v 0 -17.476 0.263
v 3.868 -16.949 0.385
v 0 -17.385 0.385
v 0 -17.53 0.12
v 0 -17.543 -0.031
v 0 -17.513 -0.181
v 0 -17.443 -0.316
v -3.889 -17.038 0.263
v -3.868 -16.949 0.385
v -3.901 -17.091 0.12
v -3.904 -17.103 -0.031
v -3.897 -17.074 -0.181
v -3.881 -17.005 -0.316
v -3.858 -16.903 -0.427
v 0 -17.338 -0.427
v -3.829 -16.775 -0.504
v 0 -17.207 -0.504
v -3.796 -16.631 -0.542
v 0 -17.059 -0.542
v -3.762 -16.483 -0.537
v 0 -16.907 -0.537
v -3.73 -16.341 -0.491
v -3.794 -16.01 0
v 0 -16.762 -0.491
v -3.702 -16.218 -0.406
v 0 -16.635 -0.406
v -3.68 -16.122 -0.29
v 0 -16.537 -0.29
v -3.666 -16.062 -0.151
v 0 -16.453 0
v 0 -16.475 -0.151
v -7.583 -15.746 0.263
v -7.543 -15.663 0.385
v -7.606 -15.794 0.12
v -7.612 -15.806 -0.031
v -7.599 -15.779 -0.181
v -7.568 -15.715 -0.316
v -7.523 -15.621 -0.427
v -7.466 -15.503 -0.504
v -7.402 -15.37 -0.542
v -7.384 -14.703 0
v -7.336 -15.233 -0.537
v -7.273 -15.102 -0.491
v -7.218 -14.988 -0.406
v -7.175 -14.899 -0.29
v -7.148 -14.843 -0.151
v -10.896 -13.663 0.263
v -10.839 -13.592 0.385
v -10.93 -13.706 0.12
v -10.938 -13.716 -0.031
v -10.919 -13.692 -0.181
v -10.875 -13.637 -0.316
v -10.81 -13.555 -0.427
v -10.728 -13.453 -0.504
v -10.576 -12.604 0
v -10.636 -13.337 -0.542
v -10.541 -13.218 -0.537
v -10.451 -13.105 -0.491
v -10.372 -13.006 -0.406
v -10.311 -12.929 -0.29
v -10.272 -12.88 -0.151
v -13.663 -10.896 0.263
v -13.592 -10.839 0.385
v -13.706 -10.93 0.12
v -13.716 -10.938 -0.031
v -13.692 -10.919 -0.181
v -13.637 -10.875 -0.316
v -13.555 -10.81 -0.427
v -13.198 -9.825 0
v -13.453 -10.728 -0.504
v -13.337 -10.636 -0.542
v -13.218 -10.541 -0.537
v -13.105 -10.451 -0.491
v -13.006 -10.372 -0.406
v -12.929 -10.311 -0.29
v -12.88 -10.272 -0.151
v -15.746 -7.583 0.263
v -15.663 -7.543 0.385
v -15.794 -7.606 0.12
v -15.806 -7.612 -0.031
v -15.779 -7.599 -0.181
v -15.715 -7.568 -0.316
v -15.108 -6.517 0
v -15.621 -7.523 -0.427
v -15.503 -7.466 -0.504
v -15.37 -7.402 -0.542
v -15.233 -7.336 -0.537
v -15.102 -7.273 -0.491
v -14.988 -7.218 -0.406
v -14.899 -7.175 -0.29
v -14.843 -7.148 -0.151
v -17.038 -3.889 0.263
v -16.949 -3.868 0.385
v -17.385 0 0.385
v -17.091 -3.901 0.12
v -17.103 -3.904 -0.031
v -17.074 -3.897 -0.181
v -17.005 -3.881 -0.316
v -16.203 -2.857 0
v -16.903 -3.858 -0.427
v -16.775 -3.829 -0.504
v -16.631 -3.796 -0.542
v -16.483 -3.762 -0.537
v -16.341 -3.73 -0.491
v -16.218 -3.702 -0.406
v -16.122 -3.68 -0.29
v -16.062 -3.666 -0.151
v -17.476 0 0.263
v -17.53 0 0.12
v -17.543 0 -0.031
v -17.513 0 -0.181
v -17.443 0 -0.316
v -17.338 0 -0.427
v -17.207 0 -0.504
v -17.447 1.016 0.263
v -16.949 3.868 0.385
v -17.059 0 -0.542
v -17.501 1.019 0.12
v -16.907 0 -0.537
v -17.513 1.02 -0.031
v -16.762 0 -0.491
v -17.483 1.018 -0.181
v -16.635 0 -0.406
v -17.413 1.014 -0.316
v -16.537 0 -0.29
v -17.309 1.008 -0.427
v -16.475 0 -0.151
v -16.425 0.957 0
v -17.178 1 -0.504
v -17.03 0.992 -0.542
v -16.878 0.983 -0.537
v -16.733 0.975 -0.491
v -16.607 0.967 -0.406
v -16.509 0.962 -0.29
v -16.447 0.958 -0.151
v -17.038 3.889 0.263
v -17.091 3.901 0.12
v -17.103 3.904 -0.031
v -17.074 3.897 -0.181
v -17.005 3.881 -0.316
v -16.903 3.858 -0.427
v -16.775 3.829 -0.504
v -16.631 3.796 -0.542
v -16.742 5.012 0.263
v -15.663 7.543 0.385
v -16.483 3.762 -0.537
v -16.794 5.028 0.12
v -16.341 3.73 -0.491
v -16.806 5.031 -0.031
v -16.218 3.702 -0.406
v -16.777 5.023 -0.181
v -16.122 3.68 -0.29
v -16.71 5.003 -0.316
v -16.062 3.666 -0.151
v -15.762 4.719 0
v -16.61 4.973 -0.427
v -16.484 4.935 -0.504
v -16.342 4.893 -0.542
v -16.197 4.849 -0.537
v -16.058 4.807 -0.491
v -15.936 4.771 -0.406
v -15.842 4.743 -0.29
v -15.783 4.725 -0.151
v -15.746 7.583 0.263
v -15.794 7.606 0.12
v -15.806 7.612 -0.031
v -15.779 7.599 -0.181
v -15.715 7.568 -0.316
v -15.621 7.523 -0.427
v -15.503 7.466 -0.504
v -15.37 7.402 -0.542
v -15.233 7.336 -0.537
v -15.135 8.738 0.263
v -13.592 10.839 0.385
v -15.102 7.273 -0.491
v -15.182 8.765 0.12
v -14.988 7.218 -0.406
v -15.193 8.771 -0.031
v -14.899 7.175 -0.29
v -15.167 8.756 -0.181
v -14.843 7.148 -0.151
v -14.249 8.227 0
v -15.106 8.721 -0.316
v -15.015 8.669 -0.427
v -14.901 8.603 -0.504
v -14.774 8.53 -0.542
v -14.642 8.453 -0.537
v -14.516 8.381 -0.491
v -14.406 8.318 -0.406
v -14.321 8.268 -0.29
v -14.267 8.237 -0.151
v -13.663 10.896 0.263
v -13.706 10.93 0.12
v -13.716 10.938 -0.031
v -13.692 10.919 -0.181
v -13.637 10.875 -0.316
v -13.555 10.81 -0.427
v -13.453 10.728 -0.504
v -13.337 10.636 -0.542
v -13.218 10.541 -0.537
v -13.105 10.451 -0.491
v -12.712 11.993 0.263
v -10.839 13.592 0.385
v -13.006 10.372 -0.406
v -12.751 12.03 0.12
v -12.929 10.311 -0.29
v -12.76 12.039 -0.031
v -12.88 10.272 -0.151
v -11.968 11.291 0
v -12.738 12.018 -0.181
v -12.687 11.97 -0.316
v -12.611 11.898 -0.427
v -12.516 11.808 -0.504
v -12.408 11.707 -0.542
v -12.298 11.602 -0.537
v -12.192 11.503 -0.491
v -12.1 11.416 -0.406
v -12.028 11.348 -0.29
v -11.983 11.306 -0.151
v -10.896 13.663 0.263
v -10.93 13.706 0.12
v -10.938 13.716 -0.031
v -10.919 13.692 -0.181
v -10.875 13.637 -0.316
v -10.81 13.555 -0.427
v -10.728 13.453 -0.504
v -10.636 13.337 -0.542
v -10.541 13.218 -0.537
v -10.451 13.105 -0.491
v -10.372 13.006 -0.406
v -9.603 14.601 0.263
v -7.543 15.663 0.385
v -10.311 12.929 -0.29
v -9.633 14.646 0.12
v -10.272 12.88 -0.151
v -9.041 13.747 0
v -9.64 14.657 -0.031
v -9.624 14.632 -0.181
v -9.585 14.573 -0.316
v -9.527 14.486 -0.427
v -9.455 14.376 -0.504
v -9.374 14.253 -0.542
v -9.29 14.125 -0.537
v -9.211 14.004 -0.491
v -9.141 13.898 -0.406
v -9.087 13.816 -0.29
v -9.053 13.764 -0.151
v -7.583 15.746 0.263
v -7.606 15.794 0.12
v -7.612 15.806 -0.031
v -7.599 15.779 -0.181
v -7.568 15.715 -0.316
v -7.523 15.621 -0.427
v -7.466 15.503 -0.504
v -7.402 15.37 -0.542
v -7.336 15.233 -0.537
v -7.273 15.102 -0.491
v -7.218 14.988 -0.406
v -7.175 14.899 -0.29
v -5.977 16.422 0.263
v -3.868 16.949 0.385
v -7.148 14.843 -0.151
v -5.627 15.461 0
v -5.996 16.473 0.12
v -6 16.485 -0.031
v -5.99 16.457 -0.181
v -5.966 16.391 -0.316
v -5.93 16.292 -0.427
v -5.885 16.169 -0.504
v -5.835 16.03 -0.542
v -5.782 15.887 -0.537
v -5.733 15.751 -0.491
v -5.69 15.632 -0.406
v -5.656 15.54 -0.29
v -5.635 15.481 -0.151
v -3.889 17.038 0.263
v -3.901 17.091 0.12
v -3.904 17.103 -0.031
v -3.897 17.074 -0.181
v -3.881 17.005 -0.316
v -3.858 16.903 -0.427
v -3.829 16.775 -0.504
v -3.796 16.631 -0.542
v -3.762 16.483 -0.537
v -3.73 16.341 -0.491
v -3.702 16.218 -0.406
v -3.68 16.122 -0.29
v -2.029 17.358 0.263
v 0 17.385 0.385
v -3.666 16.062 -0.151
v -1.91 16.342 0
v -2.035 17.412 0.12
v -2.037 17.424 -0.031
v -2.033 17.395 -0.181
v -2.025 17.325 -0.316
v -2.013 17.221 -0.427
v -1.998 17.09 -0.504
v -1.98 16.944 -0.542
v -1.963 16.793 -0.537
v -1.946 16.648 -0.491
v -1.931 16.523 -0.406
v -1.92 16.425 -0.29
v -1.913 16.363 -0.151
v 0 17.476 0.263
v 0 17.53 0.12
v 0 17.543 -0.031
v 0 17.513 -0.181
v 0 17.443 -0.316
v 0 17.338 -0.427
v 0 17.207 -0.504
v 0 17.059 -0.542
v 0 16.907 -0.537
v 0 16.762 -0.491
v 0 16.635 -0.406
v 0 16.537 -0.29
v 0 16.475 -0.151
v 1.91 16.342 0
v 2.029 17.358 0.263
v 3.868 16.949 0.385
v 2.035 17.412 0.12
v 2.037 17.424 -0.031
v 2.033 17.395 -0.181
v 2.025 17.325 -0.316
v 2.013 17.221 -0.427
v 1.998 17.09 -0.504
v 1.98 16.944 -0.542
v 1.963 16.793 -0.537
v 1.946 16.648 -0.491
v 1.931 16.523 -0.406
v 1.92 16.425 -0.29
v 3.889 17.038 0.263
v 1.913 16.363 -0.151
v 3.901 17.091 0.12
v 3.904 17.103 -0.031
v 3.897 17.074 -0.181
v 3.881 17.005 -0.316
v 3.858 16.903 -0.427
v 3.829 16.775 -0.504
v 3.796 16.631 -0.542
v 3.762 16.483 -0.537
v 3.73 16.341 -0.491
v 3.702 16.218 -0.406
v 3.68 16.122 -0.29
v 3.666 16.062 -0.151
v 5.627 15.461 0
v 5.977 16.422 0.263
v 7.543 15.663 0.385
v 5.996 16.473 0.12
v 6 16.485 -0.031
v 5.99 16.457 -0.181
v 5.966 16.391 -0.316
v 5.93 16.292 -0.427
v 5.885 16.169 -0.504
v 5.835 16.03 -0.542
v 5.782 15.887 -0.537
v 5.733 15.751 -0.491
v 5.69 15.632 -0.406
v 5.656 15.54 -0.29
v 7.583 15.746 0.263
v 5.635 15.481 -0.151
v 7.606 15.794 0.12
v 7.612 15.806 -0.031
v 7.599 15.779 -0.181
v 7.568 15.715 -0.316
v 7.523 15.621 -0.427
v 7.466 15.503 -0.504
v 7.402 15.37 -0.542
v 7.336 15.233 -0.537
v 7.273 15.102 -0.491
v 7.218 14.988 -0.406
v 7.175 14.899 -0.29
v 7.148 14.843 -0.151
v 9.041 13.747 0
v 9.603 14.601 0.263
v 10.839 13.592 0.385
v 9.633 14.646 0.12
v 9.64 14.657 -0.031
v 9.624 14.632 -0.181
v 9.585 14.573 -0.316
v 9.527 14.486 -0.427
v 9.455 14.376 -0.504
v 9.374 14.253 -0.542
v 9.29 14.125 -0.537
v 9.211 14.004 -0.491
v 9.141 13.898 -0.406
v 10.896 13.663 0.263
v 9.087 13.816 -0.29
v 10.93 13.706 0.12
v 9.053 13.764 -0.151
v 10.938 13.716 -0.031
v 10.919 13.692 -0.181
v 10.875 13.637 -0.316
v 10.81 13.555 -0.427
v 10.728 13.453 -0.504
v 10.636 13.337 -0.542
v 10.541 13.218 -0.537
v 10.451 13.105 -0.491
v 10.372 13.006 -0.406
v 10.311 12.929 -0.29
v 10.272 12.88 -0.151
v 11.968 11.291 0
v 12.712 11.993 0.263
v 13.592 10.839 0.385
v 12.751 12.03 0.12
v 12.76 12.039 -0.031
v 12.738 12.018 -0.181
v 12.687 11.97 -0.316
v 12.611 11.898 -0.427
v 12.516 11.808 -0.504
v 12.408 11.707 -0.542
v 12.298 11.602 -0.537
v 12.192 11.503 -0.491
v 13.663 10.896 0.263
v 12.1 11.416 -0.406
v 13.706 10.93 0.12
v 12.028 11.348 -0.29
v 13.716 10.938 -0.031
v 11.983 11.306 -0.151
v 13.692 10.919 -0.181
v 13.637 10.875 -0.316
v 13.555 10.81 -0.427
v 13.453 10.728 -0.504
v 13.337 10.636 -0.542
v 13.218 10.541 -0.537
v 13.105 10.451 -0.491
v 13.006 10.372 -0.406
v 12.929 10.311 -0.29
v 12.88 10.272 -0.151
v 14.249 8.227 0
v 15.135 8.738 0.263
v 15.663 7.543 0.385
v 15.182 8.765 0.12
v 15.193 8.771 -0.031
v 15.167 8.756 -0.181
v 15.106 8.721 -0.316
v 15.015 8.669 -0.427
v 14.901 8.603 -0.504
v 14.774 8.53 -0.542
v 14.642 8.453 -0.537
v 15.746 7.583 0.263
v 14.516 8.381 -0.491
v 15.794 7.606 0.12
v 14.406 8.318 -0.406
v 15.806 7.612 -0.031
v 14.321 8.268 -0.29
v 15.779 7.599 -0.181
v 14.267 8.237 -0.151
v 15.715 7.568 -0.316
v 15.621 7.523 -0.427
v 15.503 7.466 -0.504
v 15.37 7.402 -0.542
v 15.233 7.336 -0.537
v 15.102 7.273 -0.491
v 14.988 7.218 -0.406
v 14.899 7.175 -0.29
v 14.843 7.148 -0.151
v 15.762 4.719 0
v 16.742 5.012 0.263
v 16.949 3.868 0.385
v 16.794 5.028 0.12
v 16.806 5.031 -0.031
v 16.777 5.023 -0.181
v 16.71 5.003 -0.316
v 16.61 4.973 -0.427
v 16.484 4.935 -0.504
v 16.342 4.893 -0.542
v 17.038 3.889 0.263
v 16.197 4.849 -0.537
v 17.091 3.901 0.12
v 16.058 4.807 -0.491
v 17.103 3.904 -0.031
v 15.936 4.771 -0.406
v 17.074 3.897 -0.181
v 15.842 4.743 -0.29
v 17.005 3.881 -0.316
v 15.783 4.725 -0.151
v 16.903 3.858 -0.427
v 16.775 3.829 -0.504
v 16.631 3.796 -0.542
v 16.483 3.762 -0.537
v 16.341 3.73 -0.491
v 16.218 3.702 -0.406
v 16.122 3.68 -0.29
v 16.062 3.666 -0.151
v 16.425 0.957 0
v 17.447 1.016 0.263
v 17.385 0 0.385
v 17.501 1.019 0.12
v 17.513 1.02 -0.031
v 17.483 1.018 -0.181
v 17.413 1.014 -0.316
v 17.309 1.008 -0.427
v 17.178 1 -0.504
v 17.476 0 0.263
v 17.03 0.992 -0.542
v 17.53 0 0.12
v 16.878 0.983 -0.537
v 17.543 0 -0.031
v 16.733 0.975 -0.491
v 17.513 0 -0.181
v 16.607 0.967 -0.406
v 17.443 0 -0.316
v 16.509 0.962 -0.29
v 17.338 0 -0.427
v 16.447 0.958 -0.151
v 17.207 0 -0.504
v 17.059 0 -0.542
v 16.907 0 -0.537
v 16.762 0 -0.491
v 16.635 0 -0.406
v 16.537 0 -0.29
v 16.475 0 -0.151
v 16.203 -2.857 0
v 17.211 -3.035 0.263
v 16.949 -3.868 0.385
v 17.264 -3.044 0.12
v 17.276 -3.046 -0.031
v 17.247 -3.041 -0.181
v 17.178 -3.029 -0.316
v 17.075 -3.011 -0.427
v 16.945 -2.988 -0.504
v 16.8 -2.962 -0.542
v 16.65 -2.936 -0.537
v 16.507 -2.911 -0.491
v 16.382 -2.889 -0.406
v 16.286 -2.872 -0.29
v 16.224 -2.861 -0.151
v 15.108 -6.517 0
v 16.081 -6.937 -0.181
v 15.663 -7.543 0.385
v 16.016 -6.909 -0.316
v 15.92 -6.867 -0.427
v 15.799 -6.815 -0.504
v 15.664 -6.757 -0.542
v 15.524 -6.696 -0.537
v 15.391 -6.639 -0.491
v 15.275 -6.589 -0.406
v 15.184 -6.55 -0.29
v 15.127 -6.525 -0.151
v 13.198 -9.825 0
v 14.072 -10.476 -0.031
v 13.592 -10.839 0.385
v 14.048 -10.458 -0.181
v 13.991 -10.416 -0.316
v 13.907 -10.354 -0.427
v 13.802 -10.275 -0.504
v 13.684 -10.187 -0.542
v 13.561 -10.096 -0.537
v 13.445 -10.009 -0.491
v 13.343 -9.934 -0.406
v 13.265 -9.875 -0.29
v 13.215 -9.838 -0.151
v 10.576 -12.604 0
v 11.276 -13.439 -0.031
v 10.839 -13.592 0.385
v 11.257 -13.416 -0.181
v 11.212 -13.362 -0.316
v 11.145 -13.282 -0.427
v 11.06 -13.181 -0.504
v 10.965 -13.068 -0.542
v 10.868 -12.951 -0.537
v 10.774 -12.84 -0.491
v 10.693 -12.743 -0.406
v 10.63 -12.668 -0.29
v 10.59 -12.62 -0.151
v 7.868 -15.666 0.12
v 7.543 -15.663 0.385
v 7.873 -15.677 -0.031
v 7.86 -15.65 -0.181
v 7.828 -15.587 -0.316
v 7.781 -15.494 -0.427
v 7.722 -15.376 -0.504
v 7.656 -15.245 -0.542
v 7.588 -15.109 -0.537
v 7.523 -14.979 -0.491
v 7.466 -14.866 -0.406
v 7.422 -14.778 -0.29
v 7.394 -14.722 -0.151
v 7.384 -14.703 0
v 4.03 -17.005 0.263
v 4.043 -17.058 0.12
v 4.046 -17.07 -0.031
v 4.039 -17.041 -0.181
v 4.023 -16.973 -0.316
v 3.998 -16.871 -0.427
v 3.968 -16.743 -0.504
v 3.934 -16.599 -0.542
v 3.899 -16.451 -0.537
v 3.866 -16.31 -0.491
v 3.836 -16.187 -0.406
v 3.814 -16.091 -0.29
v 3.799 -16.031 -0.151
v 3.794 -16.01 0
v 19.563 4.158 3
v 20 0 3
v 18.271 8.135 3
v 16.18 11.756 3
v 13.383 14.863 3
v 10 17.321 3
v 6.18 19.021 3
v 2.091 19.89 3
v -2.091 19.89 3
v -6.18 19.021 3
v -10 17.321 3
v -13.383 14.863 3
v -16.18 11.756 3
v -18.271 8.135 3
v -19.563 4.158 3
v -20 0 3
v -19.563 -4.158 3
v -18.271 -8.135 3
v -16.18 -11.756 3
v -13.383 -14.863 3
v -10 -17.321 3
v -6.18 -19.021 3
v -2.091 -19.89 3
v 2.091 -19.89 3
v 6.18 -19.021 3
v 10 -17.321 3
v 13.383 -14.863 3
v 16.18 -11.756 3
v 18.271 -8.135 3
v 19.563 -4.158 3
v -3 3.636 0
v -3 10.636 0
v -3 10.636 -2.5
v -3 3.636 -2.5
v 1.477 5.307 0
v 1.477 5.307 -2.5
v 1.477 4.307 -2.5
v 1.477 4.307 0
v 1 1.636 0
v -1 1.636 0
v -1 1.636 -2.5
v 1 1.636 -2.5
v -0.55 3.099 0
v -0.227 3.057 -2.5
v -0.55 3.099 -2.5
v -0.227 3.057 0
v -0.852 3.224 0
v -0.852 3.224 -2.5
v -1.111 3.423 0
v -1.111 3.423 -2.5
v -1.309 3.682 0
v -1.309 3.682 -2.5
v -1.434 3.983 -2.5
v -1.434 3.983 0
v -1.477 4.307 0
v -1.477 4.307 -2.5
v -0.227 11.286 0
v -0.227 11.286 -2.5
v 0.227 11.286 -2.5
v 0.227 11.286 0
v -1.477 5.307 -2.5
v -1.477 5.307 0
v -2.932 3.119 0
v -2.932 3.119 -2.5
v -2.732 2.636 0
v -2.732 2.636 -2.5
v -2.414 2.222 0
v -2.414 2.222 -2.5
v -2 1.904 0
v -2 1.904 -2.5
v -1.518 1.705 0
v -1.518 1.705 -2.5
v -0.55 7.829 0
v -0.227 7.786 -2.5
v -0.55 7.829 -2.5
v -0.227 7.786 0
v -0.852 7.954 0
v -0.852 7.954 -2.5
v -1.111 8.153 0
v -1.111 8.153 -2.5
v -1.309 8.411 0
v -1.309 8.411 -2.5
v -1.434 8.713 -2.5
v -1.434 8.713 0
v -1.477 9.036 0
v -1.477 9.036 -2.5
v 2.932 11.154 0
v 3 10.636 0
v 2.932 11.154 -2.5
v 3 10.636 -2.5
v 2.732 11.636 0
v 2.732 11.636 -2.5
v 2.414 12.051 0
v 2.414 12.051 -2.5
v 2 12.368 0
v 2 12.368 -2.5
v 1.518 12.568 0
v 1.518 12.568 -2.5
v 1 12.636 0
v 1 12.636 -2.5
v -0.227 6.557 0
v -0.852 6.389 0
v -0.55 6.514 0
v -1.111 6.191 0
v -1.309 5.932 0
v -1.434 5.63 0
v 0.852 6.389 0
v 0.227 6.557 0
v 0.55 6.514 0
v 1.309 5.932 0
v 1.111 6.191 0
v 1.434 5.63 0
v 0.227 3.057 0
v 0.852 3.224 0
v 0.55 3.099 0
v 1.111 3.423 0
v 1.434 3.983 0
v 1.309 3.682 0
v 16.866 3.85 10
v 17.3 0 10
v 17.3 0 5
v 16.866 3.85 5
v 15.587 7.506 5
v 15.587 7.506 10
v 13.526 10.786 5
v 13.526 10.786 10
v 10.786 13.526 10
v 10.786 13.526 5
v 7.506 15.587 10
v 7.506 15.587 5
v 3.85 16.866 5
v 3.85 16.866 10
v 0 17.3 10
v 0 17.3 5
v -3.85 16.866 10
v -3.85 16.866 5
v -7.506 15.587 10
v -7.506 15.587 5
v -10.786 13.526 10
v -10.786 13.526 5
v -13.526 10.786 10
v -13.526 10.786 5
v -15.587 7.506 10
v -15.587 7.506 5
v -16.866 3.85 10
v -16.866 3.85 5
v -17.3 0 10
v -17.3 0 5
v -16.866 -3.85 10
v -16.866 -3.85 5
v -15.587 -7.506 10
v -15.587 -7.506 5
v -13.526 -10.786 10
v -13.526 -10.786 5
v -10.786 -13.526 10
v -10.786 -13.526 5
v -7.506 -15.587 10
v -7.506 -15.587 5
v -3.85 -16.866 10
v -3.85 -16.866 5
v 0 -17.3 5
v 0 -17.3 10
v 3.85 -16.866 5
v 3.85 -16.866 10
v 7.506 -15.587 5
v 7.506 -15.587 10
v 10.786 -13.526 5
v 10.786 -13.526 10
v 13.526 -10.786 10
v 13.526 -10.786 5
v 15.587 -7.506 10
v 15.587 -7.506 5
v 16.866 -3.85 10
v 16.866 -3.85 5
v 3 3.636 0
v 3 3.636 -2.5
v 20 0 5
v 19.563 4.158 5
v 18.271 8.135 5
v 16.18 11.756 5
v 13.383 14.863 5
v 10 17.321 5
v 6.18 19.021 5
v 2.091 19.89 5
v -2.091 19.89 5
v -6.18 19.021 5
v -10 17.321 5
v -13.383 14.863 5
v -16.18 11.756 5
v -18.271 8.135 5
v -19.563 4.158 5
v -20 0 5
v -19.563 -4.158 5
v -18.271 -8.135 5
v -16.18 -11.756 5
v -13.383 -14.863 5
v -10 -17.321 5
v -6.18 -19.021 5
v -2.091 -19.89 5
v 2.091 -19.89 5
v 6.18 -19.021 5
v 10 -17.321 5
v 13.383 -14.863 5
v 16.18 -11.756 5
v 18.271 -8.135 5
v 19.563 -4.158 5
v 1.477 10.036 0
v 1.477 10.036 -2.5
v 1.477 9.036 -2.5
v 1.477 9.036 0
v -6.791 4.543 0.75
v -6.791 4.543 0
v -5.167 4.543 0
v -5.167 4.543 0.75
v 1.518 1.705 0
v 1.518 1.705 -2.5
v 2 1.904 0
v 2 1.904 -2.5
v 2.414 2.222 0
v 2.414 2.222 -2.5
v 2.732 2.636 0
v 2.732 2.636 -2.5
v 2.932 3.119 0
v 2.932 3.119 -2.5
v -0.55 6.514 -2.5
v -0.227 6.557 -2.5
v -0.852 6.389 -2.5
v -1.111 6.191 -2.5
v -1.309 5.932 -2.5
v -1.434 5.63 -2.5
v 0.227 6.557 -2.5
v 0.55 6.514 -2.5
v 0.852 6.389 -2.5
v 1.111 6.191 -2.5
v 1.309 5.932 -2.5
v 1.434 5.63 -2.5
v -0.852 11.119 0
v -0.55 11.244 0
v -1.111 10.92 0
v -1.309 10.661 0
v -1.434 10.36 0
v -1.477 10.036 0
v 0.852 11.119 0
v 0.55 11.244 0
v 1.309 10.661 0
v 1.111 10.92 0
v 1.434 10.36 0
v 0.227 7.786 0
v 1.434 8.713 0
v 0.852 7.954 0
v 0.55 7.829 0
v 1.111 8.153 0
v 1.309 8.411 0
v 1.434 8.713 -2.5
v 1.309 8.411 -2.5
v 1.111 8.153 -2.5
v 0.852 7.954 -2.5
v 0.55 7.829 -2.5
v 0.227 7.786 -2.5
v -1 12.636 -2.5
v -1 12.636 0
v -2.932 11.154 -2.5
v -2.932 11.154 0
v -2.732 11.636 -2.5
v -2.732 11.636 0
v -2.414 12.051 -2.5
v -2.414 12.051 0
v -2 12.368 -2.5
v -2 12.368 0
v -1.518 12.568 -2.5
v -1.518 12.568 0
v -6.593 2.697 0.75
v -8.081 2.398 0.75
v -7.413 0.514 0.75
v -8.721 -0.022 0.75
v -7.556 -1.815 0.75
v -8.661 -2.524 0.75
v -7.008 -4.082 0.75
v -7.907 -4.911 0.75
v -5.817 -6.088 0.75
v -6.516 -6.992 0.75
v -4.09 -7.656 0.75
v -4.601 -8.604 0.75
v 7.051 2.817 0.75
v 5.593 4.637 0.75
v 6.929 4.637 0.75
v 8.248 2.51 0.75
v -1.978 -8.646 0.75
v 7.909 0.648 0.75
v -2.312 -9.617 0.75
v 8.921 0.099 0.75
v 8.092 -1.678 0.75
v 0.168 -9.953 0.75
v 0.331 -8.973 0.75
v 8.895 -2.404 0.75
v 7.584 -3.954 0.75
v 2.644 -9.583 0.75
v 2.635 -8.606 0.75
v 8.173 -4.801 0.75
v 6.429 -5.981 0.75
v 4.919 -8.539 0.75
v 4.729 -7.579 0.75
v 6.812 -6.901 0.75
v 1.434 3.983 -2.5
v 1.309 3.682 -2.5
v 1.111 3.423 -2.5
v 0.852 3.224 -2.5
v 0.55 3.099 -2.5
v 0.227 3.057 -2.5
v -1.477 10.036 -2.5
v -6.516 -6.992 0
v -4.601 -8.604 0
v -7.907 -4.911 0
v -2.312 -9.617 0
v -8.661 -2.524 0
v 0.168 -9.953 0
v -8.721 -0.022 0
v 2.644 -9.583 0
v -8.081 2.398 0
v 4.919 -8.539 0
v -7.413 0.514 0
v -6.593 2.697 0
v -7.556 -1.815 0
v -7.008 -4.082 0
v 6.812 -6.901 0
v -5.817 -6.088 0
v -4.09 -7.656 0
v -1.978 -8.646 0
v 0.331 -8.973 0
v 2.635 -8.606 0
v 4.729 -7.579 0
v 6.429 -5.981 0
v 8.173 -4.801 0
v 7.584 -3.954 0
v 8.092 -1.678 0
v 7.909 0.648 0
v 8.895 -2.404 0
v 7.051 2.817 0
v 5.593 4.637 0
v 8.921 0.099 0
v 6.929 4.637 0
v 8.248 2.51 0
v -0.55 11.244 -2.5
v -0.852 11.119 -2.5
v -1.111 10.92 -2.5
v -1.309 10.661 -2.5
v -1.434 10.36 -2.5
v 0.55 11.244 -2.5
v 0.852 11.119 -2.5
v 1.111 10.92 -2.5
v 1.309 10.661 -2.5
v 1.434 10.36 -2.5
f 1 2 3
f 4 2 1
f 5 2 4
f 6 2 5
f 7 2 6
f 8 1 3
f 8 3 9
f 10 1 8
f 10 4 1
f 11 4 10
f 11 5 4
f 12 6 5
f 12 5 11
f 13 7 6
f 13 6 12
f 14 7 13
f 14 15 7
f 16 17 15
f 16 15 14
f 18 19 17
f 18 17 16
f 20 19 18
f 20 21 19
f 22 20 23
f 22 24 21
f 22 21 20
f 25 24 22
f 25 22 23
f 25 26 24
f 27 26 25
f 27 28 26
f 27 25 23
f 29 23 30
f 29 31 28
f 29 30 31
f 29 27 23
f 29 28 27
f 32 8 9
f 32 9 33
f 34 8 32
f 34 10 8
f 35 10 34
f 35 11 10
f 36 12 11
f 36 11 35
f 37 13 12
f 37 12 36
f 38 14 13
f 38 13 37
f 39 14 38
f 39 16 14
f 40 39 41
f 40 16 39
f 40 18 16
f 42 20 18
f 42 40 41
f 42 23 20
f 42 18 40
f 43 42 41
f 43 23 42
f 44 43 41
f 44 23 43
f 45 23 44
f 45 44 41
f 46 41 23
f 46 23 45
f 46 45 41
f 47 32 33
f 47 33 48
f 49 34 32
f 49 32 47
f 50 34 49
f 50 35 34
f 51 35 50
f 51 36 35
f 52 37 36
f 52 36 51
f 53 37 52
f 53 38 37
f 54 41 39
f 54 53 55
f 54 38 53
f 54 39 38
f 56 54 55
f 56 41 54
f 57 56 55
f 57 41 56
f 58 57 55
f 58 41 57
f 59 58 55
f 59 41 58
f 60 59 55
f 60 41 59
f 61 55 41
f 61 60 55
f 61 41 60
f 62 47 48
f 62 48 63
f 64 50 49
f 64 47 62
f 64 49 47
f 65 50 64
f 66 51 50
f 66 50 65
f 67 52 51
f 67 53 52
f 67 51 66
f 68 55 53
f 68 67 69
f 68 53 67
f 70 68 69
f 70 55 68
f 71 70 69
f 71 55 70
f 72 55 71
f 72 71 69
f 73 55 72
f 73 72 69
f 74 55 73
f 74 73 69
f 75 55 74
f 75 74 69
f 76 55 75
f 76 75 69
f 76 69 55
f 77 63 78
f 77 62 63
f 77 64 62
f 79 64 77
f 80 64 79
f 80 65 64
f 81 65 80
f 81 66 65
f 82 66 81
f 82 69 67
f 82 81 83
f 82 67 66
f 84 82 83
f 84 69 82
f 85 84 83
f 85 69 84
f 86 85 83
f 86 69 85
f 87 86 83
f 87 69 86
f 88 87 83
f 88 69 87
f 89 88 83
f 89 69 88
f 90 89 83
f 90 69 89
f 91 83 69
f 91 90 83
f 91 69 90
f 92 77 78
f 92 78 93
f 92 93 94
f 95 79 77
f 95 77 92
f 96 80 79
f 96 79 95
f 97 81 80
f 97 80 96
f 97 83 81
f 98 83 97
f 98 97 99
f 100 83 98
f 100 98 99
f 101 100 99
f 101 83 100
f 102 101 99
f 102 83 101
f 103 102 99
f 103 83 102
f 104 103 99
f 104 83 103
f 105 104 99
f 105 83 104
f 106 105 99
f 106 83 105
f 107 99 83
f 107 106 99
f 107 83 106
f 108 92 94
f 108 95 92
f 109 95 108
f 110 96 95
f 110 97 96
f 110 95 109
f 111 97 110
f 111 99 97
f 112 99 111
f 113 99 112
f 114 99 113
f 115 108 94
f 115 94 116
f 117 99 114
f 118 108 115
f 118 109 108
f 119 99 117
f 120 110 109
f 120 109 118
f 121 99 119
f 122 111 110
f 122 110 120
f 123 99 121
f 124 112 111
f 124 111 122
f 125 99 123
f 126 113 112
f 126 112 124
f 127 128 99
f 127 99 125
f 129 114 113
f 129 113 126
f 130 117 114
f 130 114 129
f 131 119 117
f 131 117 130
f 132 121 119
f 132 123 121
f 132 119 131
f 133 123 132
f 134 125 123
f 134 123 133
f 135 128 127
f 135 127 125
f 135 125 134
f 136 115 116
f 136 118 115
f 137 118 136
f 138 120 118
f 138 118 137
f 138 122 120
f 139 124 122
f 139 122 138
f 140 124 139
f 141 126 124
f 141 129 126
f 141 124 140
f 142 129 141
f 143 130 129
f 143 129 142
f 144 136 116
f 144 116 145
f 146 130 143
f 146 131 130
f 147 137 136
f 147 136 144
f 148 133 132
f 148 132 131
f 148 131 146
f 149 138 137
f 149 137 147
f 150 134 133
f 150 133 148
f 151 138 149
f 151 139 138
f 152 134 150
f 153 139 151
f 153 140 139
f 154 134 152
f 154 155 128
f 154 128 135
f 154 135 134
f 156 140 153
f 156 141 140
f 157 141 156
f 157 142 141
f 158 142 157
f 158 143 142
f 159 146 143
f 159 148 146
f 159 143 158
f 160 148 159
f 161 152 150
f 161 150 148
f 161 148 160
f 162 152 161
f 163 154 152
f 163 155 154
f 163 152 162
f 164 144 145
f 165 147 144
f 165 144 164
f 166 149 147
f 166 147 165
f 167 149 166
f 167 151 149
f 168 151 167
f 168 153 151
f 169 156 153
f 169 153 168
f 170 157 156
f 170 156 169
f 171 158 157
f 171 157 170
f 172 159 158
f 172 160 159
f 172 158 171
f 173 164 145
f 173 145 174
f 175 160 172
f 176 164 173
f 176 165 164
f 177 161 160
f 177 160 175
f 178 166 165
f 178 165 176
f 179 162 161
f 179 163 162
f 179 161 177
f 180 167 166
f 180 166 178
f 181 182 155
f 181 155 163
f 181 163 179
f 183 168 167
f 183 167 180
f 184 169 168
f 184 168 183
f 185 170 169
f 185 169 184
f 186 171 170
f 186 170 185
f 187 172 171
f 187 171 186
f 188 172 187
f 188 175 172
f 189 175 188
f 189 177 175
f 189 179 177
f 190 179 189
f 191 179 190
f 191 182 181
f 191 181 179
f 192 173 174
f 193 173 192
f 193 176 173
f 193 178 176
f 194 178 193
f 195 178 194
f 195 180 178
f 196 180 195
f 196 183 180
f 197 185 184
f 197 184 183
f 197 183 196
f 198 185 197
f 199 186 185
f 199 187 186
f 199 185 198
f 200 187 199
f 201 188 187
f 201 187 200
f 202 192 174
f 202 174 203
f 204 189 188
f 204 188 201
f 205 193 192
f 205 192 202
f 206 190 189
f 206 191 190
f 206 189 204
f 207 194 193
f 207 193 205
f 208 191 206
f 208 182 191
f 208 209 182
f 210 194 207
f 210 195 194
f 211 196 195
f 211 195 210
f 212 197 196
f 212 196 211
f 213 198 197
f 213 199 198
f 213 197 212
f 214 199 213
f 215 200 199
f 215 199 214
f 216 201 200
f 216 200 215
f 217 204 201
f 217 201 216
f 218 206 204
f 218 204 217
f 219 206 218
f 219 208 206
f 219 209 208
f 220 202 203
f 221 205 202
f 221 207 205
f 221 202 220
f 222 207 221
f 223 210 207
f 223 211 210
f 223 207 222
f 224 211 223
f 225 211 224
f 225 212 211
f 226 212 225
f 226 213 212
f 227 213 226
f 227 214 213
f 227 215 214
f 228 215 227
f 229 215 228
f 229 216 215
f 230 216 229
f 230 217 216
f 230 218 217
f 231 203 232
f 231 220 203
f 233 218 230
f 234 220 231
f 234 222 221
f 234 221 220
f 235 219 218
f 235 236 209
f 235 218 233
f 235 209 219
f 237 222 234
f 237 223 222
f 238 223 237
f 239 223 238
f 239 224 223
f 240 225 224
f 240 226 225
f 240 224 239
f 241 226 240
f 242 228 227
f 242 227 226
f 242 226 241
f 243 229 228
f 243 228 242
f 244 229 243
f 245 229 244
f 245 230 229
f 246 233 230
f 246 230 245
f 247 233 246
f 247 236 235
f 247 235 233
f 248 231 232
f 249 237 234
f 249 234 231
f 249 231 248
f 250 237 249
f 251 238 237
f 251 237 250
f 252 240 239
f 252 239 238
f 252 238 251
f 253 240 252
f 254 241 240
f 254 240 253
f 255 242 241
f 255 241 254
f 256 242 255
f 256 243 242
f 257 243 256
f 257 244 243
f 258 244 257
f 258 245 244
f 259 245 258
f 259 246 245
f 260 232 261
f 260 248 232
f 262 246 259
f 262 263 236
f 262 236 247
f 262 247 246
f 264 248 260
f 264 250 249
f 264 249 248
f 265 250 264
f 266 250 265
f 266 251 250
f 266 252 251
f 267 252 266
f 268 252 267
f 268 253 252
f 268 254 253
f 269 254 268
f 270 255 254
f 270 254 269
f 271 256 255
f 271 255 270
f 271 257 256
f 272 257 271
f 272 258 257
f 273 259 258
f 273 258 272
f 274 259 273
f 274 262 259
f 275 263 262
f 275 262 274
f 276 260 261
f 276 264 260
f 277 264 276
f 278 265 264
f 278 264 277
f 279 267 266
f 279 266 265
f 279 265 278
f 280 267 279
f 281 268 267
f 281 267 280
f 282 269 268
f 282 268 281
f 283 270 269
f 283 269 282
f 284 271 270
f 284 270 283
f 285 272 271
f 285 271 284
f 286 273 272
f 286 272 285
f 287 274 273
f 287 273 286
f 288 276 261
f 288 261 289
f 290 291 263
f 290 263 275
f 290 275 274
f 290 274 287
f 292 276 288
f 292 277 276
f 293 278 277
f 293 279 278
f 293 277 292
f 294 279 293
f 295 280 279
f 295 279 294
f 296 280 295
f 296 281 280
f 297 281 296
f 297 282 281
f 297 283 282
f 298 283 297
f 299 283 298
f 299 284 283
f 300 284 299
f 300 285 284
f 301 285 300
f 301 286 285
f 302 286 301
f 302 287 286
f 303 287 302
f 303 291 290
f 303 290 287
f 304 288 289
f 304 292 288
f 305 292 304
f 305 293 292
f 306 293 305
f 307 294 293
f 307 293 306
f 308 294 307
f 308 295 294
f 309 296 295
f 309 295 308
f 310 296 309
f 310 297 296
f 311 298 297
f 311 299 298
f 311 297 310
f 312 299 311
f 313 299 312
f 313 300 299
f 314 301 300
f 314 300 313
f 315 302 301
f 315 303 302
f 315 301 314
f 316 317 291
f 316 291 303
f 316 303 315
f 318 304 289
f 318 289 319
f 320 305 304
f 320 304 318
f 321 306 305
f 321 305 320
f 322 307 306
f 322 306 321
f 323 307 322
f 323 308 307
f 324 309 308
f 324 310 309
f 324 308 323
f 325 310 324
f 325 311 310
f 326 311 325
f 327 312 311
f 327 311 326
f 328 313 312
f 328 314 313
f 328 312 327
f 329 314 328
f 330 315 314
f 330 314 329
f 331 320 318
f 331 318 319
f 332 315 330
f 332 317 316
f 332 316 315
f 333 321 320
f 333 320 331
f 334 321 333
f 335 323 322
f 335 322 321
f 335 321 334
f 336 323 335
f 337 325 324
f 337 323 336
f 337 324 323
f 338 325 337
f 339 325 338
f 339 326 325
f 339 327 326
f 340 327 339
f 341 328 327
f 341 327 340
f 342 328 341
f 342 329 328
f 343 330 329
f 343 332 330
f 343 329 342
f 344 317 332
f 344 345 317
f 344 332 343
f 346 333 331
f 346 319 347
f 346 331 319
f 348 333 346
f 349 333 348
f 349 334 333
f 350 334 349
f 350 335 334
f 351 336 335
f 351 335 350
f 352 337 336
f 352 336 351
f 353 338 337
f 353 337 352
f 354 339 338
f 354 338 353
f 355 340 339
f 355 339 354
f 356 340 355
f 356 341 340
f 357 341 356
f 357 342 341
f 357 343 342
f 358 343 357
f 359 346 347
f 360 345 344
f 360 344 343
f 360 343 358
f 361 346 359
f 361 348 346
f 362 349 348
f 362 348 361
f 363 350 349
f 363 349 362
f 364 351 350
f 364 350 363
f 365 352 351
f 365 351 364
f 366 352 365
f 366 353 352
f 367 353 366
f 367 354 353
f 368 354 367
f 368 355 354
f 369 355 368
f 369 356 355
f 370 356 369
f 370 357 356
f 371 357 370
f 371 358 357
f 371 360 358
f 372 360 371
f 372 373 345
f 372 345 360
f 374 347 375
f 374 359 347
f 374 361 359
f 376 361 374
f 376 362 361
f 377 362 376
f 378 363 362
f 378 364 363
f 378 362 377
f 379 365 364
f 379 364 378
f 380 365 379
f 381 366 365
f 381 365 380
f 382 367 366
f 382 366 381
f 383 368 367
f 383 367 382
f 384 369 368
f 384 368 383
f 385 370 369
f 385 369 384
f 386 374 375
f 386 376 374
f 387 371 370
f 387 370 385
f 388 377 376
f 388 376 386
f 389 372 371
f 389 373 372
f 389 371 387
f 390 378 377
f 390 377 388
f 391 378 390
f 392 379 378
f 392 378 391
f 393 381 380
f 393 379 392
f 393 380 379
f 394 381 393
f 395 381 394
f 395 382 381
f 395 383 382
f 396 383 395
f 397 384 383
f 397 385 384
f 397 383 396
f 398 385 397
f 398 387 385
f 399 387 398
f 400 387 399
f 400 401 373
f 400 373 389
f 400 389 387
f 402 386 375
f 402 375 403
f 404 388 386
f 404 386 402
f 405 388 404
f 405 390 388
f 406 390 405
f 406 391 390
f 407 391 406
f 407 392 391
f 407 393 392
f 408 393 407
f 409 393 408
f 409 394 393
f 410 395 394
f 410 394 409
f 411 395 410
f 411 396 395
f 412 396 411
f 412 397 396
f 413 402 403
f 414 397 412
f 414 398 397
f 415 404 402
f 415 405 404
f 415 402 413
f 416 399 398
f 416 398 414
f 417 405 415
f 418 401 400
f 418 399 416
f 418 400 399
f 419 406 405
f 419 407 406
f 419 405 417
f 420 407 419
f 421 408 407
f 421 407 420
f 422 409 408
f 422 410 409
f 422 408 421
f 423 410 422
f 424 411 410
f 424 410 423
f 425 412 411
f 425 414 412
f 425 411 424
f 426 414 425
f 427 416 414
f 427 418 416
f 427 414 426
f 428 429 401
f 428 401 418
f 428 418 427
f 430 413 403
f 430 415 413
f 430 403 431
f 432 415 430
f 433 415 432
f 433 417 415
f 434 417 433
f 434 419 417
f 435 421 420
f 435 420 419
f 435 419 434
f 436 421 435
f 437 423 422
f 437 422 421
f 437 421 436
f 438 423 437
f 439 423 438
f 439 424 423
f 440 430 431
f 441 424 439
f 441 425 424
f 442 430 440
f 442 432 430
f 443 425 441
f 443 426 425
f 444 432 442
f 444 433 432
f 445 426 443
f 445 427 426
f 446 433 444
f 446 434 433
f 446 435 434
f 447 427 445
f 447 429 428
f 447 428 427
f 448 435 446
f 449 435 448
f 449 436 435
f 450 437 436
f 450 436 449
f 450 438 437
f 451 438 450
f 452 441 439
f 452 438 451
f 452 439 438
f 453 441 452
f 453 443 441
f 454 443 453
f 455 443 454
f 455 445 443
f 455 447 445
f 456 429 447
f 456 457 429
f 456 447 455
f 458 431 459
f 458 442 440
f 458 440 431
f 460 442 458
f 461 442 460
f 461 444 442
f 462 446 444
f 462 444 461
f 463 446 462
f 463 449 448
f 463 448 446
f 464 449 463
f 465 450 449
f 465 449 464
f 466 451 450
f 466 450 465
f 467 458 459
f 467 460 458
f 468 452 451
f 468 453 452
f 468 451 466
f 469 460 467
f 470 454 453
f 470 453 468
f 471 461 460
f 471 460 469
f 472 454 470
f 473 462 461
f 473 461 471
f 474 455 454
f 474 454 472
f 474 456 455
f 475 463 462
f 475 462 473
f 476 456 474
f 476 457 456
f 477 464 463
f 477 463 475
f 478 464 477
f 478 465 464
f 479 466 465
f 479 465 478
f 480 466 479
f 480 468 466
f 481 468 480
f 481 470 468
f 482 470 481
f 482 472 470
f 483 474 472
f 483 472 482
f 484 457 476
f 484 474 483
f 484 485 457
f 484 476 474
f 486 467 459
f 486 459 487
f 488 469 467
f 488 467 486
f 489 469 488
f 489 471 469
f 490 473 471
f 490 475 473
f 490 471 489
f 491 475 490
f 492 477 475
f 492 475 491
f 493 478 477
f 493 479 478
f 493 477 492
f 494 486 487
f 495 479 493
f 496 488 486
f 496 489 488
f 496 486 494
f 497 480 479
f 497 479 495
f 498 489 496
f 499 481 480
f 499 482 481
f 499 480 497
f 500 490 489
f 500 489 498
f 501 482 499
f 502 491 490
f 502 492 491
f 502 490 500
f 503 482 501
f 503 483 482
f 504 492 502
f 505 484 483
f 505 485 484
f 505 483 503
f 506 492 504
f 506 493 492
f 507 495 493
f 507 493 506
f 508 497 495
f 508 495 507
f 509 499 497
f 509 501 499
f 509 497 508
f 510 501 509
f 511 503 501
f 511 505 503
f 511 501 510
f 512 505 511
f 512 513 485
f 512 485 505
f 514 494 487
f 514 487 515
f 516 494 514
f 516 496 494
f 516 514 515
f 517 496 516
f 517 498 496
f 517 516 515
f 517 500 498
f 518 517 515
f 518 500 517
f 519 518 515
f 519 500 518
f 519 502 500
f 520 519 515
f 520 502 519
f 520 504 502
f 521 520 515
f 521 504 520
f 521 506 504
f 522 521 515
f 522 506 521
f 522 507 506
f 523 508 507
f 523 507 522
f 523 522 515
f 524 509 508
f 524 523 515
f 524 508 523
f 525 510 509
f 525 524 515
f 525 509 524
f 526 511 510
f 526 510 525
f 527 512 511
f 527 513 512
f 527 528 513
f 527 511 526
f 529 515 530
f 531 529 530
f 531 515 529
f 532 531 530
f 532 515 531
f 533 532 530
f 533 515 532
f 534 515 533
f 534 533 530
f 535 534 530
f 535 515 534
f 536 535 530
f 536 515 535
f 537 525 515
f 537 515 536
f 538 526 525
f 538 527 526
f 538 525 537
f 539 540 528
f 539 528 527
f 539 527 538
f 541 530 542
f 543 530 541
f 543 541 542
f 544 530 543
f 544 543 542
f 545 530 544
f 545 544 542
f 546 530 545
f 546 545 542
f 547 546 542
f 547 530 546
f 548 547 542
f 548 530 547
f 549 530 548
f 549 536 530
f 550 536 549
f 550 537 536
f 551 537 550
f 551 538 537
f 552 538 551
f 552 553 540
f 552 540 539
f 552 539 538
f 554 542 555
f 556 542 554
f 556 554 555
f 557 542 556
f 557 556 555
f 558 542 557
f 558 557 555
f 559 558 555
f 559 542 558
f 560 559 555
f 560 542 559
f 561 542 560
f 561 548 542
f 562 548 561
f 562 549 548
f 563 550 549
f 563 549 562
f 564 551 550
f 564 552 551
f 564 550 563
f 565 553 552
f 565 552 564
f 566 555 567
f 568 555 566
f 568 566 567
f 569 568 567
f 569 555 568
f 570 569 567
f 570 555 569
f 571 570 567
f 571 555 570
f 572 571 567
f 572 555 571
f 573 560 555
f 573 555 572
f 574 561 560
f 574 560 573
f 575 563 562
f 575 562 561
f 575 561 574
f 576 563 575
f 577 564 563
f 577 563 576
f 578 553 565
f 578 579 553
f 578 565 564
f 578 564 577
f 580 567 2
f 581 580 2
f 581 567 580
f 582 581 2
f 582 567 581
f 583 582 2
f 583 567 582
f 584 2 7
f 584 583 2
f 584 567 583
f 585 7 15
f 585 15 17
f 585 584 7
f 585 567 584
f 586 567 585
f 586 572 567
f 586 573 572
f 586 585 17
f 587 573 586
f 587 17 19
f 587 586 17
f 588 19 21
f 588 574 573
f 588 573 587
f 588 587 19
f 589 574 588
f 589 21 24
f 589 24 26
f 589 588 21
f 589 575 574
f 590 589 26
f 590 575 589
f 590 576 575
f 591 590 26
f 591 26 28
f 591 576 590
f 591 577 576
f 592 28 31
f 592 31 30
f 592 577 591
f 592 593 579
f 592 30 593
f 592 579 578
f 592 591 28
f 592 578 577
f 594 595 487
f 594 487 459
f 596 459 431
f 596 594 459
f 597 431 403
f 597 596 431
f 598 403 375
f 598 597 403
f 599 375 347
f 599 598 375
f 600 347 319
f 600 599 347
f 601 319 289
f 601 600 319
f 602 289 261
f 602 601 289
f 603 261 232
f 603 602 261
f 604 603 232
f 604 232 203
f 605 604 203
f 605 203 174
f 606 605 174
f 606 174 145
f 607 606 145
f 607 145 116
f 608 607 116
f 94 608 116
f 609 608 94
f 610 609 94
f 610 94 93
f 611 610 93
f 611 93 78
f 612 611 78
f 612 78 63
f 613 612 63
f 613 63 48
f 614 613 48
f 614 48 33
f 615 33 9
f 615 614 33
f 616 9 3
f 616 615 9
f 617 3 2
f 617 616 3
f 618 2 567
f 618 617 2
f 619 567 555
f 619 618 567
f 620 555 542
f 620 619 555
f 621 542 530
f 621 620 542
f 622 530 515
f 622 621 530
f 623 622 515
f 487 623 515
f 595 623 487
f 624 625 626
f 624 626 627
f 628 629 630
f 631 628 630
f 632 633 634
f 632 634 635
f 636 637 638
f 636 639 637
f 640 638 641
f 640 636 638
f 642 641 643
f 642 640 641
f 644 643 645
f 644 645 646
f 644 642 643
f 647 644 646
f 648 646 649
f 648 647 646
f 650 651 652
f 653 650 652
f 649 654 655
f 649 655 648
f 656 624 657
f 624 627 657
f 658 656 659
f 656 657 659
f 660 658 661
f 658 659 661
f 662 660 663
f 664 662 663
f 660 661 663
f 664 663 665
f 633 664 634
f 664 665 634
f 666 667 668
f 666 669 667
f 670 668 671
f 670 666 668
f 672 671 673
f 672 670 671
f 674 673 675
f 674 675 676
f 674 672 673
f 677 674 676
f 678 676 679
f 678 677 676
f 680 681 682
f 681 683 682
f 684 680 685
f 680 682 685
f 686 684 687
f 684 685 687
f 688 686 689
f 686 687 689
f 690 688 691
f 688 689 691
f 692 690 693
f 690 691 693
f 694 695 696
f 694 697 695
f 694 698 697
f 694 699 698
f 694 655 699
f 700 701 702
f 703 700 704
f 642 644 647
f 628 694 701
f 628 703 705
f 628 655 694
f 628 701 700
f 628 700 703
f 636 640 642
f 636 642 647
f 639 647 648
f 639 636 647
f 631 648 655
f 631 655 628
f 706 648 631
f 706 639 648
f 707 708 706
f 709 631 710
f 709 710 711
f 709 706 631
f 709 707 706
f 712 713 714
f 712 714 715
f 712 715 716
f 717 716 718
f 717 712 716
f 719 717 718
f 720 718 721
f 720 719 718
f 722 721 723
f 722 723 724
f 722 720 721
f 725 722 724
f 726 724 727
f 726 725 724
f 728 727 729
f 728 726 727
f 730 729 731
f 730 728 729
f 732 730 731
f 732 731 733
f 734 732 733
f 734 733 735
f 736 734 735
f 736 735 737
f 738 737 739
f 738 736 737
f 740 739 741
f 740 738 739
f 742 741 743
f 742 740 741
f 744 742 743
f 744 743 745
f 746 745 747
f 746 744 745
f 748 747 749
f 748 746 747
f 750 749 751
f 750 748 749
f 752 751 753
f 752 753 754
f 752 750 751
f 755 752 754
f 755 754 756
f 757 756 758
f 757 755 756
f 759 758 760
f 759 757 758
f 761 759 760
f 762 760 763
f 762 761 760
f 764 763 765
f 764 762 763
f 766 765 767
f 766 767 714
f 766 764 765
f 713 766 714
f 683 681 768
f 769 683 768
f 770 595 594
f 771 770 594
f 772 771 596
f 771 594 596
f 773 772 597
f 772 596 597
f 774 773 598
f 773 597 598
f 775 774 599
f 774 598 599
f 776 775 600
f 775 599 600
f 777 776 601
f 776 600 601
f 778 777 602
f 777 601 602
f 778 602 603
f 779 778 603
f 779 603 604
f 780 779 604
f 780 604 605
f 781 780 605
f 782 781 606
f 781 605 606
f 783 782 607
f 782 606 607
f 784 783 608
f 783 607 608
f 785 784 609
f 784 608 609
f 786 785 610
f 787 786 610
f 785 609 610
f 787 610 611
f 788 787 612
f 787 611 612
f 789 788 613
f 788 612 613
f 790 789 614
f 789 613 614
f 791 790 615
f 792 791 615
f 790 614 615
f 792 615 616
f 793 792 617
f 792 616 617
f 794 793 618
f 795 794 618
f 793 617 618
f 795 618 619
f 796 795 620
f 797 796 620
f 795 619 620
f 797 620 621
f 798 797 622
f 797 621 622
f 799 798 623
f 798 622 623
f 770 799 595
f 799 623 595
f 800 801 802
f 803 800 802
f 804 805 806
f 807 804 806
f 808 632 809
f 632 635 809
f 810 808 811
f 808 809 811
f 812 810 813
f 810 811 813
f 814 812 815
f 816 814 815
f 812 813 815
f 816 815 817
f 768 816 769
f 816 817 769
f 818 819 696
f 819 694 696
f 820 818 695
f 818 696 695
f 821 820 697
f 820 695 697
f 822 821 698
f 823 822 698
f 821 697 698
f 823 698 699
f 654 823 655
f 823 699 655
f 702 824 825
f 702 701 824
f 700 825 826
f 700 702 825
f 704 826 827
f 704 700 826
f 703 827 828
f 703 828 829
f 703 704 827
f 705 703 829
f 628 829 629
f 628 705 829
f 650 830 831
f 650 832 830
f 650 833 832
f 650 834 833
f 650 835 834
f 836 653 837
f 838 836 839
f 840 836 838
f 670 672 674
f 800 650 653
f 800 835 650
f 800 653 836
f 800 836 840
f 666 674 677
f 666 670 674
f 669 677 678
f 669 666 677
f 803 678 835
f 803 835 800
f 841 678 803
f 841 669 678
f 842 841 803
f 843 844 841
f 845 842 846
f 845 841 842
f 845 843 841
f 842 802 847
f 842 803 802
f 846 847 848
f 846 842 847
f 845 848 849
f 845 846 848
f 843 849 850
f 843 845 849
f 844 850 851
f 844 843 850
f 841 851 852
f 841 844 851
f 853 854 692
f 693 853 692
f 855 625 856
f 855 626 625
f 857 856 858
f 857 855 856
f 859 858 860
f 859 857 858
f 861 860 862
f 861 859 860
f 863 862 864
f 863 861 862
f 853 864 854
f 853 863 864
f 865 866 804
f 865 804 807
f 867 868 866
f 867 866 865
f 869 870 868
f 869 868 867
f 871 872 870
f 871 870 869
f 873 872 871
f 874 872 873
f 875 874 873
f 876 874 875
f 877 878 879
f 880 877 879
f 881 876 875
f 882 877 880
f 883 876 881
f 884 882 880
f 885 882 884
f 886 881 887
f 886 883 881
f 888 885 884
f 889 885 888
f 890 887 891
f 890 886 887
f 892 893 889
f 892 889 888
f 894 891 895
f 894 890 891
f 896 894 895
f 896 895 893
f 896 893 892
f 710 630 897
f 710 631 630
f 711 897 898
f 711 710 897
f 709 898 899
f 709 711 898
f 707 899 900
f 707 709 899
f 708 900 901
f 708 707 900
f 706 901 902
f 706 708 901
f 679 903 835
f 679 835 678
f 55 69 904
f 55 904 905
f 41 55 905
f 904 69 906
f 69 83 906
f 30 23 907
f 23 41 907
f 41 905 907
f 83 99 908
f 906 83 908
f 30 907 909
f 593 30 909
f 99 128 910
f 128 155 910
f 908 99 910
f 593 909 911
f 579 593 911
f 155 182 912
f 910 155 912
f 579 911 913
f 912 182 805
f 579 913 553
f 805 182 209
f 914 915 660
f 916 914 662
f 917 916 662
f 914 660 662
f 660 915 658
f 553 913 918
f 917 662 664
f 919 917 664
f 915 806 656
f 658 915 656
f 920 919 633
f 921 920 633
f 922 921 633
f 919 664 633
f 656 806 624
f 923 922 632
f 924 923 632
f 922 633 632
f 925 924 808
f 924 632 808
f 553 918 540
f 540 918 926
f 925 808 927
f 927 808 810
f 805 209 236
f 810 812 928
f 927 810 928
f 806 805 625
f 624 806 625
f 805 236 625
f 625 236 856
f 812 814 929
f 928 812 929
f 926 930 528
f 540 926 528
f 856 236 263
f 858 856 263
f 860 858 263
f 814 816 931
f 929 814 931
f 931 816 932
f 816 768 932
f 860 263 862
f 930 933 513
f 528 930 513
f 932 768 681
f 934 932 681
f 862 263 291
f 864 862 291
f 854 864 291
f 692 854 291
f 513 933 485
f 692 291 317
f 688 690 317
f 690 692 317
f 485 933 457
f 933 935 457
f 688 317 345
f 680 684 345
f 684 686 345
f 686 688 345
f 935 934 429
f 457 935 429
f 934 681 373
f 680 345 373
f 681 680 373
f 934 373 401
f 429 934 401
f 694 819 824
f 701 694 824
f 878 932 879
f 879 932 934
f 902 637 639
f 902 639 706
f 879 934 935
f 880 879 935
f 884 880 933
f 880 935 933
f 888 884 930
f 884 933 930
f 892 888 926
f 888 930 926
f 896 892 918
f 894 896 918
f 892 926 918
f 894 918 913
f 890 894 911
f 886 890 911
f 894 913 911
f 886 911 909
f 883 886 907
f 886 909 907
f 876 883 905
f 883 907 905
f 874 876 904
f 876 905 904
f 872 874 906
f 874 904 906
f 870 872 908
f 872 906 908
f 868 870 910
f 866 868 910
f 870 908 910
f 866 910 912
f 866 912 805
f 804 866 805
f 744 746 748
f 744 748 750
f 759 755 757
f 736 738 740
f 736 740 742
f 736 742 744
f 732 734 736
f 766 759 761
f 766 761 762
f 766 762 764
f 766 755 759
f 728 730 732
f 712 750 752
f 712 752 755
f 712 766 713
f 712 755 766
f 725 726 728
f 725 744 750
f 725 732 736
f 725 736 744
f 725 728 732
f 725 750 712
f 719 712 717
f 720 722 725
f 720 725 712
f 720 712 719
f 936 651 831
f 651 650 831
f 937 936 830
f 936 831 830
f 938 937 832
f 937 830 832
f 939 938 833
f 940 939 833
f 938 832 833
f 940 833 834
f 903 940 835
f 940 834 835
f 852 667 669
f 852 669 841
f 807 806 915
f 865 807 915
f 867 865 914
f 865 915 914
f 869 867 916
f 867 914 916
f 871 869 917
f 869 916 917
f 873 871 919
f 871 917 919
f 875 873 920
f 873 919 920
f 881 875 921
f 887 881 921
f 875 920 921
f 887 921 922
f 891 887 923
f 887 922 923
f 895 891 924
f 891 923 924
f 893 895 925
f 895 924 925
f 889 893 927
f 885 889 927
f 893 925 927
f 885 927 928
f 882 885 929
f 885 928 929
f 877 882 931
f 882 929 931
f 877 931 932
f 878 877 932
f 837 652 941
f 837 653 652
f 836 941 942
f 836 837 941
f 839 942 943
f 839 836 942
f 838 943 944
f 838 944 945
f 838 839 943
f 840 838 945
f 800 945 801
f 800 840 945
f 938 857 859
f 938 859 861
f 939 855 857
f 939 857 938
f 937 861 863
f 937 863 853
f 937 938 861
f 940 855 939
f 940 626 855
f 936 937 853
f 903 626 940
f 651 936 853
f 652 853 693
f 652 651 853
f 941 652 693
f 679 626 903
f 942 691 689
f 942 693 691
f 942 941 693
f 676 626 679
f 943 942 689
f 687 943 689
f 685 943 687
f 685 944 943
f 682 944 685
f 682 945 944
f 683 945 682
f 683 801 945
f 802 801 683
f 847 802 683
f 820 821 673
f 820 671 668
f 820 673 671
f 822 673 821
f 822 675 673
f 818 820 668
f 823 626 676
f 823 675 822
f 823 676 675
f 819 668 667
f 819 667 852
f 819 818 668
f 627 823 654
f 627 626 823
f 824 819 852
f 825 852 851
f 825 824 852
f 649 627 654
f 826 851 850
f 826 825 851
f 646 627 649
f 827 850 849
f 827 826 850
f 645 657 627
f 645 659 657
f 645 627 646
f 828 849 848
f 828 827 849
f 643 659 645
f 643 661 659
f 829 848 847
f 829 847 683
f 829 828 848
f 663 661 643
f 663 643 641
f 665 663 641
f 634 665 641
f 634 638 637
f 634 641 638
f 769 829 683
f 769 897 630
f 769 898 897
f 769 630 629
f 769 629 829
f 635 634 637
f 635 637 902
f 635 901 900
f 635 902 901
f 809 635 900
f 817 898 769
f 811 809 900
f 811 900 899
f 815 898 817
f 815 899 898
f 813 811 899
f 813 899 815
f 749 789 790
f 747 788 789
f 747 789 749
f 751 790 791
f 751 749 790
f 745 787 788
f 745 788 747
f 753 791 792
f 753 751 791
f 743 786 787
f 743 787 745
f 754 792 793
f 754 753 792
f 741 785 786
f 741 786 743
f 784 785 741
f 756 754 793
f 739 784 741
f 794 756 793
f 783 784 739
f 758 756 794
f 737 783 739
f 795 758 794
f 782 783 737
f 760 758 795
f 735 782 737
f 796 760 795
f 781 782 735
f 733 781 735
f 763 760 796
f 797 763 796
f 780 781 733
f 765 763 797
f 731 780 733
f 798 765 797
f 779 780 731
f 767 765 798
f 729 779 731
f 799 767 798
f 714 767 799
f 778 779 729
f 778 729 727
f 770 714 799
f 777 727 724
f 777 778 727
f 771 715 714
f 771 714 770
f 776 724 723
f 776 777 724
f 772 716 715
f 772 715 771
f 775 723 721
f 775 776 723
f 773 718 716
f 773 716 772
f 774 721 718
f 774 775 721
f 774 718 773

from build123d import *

# Parameters (mm, degrees)
F0_R      = 20
F1_DEPTH  = 5
F2_R      = 16.6
F3_DEPTH  = 5
F4_W      = 6
F4_H      = 11
F5_DEPTH  = 2.5
F6_R      = 2
F7_SIZE   = 3
F8_W      = 2.95381
F8_H      = 3.5
F9_DEPTH  = 2.5
F10_R     = 1.25
F12_DEPTH = 0.75
F13_R     = 0.545211
F15_R     = 17.3
F15_R_2   = 16.6
F16_DEPTH = 5


with BuildPart() as f1:
    # F0 (on Top) → F1 (new body)
    with BuildSketch(Plane.XY):
        Circle(F0_R)
    extrude(amount=F1_DEPTH)

    # F2 (on face) → F3 (join)
    with BuildSketch(Plane.XY.offset(5)):
        Circle(F2_R)
    extrude(amount=F3_DEPTH)

    # F4 (on face) → F5 (join)
    with BuildSketch(Plane(origin=(0, 0, 0), x_dir=(1, 0, 0), z_dir=(0, 0, -1))):
        with Locations((0, -7.136372)):
            Rectangle(F4_W, F4_H)
    extrude(amount=F5_DEPTH)

    # F6
    f6_edges = [f1.edges().sort_by_distance(p)[0] for p in [
        (-3, 12.636372, -1.25),
        (3, 12.636372, -1.25),
        (3, 1.636372, -1.25),
        (-3, 1.636372, -1.25),
    ]]
    fillet(f6_edges, radius=F6_R)

    # F7
    f7_edges = [f1.edges().sort_by_distance(p)[0] for p in [
        (-20, 0, 0),
    ]]
    chamfer(f7_edges, length=F7_SIZE)

    # F8 (on face) → F9 (cut)
    with BuildSketch(Plane(origin=(0, 0, -2.5), x_dir=(1, 0, 0), z_dir=(0, 0, -1))):
        with Locations((0, -4.806658)):
            Rectangle(F8_W, F8_H)
        with Locations((0, -9.536388)):
            Rectangle(F8_W, F8_H)
    extrude(amount=-F9_DEPTH, mode=Mode.SUBTRACT)

    # F10
    f10_edges = [f1.edges().sort_by_distance(p)[0] for p in [
        (1.476905, 3.056658, -1.25),
        (-1.476905, 3.056658, -1.25),
        (1.476905, 6.556658, -1.25),
        (-1.476905, 6.556658, -1.25),
        (1.476905, 7.786388, -1.25),
        (-1.476905, 7.786388, -1.25),
        (-1.476905, 11.286388, -1.25),
        (1.476905, 11.286388, -1.25),
    ]]
    fillet(f10_edges, radius=F10_R)

    # F11 (on face) → F12 (cut)
    with BuildSketch(Plane(origin=(0, 0, 0), x_dir=(1, 0, 0), z_dir=(0, 0, -1))):
        with BuildLine():
            Line((5.592829, -4.637425), (6.928778, -4.637425))
            ThreePointArc((6.928778, -4.637425), (0.168305, 9.952743), (-6.79139, -4.543452))
            Line((-6.79139, -4.543452), (-5.167165, -4.543452))
            ThreePointArc((-5.167165, -4.543452), (0.331289, 8.972893), (5.592829, -4.637425))
        make_face()
    extrude(amount=-F12_DEPTH, mode=Mode.SUBTRACT)

    # F13 (on Right) → F14 (revolve)
    with BuildSketch(Plane.YZ):
        with Locations((-16.998546, 0)):
            Circle(F13_R)
    revolve(axis=Axis((0, 0, -2.59406), (0, 0, -1)))

    # F15 (on face) → F16 (join)
    with BuildSketch(Plane.XY.offset(10)):
        Circle(F15_R)
        Circle(F15_R_2, mode=Mode.SUBTRACT)
    extrude(amount=-F16_DEPTH)


solid = f1.part
